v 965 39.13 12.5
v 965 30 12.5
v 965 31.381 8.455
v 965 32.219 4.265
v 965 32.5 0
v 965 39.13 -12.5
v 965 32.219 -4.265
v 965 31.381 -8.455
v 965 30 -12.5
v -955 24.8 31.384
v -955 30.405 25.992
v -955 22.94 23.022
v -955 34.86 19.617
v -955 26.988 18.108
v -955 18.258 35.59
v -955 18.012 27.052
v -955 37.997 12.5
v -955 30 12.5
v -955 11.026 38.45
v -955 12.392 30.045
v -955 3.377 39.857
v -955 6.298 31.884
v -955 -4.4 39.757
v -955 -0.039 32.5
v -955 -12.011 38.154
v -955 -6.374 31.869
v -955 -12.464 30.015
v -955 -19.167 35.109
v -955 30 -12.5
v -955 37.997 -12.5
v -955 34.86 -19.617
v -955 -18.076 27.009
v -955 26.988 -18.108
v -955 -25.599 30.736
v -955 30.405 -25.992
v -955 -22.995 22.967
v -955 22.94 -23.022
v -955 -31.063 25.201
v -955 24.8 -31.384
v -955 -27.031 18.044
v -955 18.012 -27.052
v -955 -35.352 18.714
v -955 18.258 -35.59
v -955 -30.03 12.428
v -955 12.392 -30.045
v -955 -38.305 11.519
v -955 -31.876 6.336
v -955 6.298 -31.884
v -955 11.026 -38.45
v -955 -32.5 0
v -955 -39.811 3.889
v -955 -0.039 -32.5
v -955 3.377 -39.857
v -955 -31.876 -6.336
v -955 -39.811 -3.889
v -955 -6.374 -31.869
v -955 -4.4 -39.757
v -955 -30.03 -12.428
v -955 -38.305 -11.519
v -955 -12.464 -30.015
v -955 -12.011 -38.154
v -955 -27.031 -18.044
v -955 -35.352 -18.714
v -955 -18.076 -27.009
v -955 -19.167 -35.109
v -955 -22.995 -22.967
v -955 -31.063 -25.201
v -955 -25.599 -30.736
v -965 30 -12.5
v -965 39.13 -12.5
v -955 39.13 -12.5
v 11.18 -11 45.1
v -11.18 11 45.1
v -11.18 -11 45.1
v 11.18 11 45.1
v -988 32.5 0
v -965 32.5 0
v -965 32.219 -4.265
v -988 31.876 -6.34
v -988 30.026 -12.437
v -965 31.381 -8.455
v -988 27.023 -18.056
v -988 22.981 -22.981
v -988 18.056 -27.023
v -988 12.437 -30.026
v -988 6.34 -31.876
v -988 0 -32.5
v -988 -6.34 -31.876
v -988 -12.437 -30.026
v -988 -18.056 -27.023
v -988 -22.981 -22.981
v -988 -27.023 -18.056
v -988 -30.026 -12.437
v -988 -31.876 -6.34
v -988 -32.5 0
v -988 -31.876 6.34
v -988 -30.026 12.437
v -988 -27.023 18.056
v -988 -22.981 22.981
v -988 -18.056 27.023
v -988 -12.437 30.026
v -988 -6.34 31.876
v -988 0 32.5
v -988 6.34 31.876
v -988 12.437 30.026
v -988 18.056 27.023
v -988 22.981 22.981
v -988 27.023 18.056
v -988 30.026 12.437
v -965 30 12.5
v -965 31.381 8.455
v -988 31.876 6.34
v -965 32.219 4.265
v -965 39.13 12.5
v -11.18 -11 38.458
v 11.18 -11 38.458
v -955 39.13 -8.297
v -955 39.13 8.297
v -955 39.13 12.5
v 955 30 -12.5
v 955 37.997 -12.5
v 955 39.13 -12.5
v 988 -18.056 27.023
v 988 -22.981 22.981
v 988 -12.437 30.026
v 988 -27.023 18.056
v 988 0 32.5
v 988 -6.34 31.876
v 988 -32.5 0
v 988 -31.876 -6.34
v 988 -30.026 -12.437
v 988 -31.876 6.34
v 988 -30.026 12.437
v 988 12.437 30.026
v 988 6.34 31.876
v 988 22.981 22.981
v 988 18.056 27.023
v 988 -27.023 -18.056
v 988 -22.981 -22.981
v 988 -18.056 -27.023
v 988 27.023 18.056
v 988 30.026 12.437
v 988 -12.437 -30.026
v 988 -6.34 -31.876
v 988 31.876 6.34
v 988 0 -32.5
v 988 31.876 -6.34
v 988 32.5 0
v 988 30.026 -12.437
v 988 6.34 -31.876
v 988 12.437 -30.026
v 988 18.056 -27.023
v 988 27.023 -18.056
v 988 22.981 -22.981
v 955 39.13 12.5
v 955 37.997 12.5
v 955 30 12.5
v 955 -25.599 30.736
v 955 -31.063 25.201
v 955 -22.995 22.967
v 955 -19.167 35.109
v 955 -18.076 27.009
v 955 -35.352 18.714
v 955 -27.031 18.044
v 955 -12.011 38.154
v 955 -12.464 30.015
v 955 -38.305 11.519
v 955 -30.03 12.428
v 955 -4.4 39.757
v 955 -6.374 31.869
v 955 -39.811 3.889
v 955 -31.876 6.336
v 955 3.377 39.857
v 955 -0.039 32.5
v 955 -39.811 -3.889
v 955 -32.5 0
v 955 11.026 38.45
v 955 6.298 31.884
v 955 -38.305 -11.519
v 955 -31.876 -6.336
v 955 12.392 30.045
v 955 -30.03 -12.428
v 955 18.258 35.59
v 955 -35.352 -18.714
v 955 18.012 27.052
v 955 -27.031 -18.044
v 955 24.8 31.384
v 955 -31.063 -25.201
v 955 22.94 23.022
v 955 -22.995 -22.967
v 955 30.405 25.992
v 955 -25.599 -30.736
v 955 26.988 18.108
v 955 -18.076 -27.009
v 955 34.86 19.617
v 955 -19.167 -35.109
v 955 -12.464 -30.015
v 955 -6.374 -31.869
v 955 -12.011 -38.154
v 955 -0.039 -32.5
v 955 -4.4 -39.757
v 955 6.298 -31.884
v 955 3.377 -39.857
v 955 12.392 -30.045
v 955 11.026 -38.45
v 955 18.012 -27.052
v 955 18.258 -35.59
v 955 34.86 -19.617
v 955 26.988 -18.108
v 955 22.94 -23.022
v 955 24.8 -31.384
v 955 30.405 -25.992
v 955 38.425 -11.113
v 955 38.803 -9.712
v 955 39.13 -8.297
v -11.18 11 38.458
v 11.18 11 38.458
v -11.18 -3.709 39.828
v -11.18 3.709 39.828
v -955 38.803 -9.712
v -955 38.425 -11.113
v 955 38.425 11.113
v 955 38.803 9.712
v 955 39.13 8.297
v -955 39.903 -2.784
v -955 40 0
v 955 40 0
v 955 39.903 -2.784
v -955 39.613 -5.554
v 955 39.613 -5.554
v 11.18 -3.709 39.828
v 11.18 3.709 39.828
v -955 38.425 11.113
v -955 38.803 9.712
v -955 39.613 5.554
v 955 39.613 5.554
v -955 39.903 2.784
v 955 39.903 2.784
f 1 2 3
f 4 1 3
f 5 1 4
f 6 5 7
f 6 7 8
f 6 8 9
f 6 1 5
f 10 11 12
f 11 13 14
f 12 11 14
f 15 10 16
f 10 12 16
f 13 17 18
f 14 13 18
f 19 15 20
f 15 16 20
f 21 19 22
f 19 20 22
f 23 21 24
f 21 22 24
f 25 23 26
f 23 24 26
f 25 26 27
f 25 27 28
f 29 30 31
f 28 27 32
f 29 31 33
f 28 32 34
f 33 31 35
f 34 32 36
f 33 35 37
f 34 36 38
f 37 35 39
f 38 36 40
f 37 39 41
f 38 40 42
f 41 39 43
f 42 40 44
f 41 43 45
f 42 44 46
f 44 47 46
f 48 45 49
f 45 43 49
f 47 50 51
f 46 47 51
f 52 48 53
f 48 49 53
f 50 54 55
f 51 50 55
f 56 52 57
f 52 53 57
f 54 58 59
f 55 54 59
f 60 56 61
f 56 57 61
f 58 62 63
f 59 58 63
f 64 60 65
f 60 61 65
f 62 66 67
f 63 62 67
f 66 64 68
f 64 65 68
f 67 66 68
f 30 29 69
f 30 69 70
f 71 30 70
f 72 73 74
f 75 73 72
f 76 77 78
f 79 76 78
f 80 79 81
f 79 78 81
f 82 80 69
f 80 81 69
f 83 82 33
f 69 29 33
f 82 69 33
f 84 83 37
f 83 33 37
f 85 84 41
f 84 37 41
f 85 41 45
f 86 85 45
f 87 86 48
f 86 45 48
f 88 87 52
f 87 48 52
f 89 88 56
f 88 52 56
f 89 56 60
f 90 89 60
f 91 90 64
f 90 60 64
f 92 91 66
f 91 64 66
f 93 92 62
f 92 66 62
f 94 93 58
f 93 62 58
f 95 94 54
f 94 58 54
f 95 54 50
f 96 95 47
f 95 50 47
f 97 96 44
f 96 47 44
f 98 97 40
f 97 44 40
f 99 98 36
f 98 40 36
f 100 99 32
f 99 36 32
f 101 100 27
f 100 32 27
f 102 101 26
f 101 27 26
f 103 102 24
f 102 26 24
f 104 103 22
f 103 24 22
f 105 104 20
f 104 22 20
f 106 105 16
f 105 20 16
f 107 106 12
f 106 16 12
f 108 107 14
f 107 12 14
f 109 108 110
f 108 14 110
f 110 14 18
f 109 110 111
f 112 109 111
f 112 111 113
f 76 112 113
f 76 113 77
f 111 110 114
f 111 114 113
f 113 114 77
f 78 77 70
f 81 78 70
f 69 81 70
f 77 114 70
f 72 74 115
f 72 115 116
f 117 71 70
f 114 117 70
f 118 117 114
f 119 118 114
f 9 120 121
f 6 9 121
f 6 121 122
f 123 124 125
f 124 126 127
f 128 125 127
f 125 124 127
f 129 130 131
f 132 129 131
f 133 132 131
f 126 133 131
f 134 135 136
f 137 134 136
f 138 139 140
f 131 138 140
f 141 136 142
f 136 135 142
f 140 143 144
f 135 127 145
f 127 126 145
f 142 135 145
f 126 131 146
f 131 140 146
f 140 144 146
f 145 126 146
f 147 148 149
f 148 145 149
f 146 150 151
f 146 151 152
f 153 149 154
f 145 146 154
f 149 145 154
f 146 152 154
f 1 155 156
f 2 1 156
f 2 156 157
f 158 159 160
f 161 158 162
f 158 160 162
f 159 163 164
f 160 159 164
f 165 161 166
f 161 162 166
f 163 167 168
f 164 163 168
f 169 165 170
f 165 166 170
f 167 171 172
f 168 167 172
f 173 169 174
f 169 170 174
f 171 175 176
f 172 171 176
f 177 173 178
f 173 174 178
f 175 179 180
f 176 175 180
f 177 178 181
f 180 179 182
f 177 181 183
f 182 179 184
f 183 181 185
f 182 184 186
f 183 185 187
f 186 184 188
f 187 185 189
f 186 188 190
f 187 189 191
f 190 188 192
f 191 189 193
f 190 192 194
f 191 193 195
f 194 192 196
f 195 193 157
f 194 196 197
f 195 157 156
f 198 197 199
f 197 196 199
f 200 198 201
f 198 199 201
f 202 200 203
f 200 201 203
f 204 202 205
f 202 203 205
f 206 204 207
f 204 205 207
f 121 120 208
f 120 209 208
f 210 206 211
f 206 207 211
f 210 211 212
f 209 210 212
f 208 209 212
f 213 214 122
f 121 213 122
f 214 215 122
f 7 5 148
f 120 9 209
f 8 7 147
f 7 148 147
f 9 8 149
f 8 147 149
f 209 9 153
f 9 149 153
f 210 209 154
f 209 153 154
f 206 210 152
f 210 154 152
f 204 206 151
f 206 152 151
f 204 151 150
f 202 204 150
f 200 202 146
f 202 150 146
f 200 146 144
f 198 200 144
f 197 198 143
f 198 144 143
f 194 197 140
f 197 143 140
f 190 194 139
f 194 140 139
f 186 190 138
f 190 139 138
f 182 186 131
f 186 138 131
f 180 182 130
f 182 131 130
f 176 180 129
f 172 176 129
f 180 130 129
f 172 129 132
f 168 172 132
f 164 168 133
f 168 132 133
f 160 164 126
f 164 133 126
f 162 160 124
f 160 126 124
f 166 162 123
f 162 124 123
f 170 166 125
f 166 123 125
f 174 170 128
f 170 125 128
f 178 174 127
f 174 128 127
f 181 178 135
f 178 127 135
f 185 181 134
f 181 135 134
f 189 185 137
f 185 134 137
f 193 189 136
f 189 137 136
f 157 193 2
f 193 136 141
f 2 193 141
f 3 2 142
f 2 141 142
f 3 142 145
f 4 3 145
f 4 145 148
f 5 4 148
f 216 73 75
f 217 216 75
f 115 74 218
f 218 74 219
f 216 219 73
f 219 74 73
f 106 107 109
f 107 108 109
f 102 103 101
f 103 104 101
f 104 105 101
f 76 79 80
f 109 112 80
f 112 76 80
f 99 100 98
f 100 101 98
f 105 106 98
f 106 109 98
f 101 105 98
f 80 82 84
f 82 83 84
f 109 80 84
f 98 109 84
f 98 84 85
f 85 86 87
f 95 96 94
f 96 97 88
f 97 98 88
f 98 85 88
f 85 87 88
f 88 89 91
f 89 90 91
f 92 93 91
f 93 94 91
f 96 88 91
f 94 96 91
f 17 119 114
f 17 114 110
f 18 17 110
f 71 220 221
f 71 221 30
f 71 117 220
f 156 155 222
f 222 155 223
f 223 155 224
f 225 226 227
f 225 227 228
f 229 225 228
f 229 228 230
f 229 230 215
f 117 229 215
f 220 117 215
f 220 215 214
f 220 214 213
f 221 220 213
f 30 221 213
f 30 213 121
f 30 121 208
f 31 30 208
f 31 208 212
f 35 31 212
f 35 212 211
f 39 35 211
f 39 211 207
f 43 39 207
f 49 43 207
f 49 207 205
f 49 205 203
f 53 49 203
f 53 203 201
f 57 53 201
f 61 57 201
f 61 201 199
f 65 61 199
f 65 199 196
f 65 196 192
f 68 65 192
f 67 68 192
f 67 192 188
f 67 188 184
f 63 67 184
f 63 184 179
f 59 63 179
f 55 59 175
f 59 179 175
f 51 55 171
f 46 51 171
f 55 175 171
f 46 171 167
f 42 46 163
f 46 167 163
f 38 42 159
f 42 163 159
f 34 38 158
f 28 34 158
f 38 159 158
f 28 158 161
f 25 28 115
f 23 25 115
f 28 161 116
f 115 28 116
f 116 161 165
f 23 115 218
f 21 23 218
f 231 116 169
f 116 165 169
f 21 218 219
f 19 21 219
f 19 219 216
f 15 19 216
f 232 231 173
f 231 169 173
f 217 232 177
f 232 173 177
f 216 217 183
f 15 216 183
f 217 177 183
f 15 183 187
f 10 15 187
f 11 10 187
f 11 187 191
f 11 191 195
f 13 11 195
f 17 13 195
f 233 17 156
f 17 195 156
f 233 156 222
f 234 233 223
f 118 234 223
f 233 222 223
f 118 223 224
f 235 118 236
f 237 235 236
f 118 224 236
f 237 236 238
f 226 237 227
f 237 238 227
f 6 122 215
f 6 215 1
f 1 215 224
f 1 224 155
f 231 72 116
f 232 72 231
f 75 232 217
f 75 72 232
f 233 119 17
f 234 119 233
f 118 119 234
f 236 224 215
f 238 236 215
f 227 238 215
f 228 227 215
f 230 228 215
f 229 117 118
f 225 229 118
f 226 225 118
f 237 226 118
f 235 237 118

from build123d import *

# Parameters (mm, degrees)
BOSS_EXTRUDE1_REACH      = 994.465
BOSS_EXTRUDE1_END_RADIUS = 40
SKETCH4_W                = 22.36
SKETCH4_H                = 22
BOSS_EXTRUDE2_DEPTH      = 10


with BuildPart() as part:
    # Sketch1 → Revolve1 (revolve)
    with BuildSketch(Plane.XY):
        Polygon((-988, 0), (-988, 32.5), (-955, 32.5), (-955, 40), (955, 40), (955, 32.5), (988, 32.5), (988, 0), align=None)
    revolve(axis=Axis((988, 0, 0), (-1, 0, 0)))

    # Boss-Extrude1: up to this cylinder (the profile starts outside it)
    boss_extrude1_end = Plane(origin=(0, 0, 0), z_dir=(1, 0, 0)) * Cylinder(BOSS_EXTRUDE1_END_RADIUS, 2069.93, mode=Mode.PRIVATE)
    # Sketch4 → Boss-Extrude1 (add, up to the surface)
    with BuildSketch(Plane.XY.offset(45.1), mode=Mode.PRIVATE) as boss_extrude1_sk1:
        Rectangle(SKETCH4_W, SKETCH4_H)
    boss_extrude1_tool1 = extrude(boss_extrude1_sk1.sketch, amount=-BOSS_EXTRUDE1_REACH, mode=Mode.PRIVATE) - boss_extrude1_end
    add(boss_extrude1_tool1.solids().sort_by_distance((0, 0, 45.1))[0])

    # Sketch5 → Boss-Extrude2 (add)
    with BuildSketch(Plane.ZY.offset(955)):
        with BuildLine():
            Line((-12.5, 30), (-12.5, 39.13))
            Line((-12.5, 39.13), (12.5, 39.13))
            Line((12.5, 39.13), (12.5, 30))
            ThreePointArc((12.5, 30), (0, 32.5), (-12.5, 30))
        make_face()
    boss_extrude2 = extrude(amount=BOSS_EXTRUDE2_DEPTH)

    # Mirror1: Boss-Extrude2 across plane
    add(boss_extrude2.mirror(Plane.ZY))


solid = part.part
